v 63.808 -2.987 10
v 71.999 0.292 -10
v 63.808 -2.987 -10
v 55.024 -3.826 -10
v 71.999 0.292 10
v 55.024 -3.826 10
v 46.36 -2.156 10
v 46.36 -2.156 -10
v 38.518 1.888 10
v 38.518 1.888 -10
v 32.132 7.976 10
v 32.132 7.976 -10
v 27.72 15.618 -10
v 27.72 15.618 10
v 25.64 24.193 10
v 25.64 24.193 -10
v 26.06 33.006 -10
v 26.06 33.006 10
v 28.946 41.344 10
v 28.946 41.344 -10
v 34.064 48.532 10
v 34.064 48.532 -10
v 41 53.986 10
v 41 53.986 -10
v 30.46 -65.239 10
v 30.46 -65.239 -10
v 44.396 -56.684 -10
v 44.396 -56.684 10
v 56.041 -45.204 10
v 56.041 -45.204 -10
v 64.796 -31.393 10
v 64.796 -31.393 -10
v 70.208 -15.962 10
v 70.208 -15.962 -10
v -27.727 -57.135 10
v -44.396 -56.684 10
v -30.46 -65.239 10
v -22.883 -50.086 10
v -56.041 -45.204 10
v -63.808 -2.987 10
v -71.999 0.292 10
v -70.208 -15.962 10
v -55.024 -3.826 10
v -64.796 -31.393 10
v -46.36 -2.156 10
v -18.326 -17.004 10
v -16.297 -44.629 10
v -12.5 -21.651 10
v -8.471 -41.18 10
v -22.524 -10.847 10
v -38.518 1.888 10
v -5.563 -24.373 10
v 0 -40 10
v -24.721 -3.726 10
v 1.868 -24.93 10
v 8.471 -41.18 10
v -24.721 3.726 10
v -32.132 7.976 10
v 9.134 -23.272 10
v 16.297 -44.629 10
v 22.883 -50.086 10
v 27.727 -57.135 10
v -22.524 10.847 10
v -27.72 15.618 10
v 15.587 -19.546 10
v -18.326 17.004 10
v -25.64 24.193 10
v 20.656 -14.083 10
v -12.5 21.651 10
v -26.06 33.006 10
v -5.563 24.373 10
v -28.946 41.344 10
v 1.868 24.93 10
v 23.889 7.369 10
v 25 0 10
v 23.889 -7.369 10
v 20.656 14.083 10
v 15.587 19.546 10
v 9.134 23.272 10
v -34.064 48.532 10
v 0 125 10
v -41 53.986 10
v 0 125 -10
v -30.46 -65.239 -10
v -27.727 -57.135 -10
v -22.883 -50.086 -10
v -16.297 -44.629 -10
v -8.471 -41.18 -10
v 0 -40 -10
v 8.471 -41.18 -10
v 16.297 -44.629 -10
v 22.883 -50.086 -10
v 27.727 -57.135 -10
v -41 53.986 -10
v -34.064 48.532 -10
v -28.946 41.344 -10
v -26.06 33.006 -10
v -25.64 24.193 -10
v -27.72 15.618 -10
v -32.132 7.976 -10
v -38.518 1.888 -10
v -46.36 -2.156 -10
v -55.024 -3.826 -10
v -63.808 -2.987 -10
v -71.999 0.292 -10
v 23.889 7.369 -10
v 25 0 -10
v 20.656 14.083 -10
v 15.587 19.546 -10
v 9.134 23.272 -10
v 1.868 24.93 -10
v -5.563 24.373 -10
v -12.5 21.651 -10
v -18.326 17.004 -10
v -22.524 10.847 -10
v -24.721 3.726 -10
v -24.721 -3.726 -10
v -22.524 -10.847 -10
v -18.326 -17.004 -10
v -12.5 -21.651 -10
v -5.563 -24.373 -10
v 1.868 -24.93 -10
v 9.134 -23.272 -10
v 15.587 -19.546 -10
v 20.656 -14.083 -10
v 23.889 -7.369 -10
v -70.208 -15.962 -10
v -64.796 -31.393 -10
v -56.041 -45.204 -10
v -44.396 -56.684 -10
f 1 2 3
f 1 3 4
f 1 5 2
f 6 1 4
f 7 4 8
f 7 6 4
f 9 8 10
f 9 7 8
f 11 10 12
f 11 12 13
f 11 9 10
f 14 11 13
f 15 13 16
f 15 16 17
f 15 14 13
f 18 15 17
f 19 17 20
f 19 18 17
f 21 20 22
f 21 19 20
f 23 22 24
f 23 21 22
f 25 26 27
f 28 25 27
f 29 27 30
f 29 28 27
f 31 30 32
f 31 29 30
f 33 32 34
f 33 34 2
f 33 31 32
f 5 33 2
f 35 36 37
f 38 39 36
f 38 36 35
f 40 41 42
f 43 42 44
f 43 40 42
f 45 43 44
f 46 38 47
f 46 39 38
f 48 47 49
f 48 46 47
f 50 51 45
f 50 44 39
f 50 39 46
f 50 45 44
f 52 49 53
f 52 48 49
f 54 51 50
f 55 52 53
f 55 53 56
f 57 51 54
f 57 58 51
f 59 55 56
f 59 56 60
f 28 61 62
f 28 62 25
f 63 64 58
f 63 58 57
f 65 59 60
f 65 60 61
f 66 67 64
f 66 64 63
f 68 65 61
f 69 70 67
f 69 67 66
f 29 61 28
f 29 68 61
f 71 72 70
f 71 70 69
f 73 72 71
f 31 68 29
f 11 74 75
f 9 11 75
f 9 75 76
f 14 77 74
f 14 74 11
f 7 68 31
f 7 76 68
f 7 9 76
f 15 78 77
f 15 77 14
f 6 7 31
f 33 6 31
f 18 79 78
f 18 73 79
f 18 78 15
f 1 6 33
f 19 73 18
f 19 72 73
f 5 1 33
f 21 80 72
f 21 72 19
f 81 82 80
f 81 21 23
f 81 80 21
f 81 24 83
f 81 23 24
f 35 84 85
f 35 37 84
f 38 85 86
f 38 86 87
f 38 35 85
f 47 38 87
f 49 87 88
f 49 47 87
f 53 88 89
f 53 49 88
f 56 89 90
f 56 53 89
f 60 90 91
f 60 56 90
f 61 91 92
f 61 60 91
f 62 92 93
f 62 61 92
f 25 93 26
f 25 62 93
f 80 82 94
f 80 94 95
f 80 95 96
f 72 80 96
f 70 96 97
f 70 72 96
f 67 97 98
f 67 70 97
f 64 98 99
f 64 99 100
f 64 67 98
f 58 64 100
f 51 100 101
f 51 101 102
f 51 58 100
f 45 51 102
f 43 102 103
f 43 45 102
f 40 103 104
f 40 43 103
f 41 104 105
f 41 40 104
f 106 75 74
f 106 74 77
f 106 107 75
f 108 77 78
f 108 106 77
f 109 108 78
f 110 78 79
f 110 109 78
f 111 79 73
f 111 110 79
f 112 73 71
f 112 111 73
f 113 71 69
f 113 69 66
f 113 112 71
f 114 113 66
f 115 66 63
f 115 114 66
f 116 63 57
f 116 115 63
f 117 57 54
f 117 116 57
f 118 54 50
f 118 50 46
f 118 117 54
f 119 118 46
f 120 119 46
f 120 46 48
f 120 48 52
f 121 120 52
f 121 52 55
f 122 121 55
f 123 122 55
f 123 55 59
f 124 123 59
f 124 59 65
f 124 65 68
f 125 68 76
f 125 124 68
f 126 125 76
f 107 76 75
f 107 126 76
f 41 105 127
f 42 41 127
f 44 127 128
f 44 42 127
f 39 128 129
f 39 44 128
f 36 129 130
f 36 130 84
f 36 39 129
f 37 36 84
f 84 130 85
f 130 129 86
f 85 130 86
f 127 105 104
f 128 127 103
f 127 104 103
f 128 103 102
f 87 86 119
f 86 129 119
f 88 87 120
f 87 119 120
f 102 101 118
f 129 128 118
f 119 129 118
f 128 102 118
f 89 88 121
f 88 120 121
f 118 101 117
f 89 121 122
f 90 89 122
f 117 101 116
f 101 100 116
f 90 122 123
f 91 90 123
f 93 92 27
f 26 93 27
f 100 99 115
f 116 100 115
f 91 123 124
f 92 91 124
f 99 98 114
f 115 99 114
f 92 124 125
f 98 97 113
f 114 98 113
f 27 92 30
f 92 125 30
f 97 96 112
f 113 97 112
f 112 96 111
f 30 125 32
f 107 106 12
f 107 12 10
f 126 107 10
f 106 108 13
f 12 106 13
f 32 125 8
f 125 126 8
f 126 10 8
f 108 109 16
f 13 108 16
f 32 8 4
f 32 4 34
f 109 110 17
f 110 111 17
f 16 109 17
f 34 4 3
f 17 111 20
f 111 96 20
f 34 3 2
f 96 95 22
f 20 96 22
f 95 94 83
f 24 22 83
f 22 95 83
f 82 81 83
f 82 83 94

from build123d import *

# Parameters (mm, degrees)
SKETCH1_R           = 25
BOSS_EXTRUDE1_DEPTH = 10


with BuildPart() as part:
    # Sketch1 → Boss-Extrude1 (new body, symmetric)
    with BuildSketch(Plane.XY):
        with BuildLine():
            Line((41, 53.98591689), (0, 125))
            Line((0, 125), (-41, 53.98591689))
            ThreePointArc((-41, 53.98591689), (-29.653041557, 11.639425428), (-71.999407886, 0.292000007))
            ThreePointArc((-71.999407886, 0.292000007), (-60.81182851, -38.5476525), (-30.460070741, -65.23943662))
            ThreePointArc((-30.460070741, -65.23943662), (0, -40), (30.460070741, -65.23943662))
            ThreePointArc((30.460070741, -65.23943662), (60.81182851, -38.5476525), (71.999407886, 0.292000007))
            ThreePointArc((71.999407886, 0.292000007), (29.653041557, 11.639425428), (41, 53.98591689))
        make_face()
        Circle(SKETCH1_R, mode=Mode.SUBTRACT)
    extrude(amount=BOSS_EXTRUDE1_DEPTH, both=True)


solid = part.part
